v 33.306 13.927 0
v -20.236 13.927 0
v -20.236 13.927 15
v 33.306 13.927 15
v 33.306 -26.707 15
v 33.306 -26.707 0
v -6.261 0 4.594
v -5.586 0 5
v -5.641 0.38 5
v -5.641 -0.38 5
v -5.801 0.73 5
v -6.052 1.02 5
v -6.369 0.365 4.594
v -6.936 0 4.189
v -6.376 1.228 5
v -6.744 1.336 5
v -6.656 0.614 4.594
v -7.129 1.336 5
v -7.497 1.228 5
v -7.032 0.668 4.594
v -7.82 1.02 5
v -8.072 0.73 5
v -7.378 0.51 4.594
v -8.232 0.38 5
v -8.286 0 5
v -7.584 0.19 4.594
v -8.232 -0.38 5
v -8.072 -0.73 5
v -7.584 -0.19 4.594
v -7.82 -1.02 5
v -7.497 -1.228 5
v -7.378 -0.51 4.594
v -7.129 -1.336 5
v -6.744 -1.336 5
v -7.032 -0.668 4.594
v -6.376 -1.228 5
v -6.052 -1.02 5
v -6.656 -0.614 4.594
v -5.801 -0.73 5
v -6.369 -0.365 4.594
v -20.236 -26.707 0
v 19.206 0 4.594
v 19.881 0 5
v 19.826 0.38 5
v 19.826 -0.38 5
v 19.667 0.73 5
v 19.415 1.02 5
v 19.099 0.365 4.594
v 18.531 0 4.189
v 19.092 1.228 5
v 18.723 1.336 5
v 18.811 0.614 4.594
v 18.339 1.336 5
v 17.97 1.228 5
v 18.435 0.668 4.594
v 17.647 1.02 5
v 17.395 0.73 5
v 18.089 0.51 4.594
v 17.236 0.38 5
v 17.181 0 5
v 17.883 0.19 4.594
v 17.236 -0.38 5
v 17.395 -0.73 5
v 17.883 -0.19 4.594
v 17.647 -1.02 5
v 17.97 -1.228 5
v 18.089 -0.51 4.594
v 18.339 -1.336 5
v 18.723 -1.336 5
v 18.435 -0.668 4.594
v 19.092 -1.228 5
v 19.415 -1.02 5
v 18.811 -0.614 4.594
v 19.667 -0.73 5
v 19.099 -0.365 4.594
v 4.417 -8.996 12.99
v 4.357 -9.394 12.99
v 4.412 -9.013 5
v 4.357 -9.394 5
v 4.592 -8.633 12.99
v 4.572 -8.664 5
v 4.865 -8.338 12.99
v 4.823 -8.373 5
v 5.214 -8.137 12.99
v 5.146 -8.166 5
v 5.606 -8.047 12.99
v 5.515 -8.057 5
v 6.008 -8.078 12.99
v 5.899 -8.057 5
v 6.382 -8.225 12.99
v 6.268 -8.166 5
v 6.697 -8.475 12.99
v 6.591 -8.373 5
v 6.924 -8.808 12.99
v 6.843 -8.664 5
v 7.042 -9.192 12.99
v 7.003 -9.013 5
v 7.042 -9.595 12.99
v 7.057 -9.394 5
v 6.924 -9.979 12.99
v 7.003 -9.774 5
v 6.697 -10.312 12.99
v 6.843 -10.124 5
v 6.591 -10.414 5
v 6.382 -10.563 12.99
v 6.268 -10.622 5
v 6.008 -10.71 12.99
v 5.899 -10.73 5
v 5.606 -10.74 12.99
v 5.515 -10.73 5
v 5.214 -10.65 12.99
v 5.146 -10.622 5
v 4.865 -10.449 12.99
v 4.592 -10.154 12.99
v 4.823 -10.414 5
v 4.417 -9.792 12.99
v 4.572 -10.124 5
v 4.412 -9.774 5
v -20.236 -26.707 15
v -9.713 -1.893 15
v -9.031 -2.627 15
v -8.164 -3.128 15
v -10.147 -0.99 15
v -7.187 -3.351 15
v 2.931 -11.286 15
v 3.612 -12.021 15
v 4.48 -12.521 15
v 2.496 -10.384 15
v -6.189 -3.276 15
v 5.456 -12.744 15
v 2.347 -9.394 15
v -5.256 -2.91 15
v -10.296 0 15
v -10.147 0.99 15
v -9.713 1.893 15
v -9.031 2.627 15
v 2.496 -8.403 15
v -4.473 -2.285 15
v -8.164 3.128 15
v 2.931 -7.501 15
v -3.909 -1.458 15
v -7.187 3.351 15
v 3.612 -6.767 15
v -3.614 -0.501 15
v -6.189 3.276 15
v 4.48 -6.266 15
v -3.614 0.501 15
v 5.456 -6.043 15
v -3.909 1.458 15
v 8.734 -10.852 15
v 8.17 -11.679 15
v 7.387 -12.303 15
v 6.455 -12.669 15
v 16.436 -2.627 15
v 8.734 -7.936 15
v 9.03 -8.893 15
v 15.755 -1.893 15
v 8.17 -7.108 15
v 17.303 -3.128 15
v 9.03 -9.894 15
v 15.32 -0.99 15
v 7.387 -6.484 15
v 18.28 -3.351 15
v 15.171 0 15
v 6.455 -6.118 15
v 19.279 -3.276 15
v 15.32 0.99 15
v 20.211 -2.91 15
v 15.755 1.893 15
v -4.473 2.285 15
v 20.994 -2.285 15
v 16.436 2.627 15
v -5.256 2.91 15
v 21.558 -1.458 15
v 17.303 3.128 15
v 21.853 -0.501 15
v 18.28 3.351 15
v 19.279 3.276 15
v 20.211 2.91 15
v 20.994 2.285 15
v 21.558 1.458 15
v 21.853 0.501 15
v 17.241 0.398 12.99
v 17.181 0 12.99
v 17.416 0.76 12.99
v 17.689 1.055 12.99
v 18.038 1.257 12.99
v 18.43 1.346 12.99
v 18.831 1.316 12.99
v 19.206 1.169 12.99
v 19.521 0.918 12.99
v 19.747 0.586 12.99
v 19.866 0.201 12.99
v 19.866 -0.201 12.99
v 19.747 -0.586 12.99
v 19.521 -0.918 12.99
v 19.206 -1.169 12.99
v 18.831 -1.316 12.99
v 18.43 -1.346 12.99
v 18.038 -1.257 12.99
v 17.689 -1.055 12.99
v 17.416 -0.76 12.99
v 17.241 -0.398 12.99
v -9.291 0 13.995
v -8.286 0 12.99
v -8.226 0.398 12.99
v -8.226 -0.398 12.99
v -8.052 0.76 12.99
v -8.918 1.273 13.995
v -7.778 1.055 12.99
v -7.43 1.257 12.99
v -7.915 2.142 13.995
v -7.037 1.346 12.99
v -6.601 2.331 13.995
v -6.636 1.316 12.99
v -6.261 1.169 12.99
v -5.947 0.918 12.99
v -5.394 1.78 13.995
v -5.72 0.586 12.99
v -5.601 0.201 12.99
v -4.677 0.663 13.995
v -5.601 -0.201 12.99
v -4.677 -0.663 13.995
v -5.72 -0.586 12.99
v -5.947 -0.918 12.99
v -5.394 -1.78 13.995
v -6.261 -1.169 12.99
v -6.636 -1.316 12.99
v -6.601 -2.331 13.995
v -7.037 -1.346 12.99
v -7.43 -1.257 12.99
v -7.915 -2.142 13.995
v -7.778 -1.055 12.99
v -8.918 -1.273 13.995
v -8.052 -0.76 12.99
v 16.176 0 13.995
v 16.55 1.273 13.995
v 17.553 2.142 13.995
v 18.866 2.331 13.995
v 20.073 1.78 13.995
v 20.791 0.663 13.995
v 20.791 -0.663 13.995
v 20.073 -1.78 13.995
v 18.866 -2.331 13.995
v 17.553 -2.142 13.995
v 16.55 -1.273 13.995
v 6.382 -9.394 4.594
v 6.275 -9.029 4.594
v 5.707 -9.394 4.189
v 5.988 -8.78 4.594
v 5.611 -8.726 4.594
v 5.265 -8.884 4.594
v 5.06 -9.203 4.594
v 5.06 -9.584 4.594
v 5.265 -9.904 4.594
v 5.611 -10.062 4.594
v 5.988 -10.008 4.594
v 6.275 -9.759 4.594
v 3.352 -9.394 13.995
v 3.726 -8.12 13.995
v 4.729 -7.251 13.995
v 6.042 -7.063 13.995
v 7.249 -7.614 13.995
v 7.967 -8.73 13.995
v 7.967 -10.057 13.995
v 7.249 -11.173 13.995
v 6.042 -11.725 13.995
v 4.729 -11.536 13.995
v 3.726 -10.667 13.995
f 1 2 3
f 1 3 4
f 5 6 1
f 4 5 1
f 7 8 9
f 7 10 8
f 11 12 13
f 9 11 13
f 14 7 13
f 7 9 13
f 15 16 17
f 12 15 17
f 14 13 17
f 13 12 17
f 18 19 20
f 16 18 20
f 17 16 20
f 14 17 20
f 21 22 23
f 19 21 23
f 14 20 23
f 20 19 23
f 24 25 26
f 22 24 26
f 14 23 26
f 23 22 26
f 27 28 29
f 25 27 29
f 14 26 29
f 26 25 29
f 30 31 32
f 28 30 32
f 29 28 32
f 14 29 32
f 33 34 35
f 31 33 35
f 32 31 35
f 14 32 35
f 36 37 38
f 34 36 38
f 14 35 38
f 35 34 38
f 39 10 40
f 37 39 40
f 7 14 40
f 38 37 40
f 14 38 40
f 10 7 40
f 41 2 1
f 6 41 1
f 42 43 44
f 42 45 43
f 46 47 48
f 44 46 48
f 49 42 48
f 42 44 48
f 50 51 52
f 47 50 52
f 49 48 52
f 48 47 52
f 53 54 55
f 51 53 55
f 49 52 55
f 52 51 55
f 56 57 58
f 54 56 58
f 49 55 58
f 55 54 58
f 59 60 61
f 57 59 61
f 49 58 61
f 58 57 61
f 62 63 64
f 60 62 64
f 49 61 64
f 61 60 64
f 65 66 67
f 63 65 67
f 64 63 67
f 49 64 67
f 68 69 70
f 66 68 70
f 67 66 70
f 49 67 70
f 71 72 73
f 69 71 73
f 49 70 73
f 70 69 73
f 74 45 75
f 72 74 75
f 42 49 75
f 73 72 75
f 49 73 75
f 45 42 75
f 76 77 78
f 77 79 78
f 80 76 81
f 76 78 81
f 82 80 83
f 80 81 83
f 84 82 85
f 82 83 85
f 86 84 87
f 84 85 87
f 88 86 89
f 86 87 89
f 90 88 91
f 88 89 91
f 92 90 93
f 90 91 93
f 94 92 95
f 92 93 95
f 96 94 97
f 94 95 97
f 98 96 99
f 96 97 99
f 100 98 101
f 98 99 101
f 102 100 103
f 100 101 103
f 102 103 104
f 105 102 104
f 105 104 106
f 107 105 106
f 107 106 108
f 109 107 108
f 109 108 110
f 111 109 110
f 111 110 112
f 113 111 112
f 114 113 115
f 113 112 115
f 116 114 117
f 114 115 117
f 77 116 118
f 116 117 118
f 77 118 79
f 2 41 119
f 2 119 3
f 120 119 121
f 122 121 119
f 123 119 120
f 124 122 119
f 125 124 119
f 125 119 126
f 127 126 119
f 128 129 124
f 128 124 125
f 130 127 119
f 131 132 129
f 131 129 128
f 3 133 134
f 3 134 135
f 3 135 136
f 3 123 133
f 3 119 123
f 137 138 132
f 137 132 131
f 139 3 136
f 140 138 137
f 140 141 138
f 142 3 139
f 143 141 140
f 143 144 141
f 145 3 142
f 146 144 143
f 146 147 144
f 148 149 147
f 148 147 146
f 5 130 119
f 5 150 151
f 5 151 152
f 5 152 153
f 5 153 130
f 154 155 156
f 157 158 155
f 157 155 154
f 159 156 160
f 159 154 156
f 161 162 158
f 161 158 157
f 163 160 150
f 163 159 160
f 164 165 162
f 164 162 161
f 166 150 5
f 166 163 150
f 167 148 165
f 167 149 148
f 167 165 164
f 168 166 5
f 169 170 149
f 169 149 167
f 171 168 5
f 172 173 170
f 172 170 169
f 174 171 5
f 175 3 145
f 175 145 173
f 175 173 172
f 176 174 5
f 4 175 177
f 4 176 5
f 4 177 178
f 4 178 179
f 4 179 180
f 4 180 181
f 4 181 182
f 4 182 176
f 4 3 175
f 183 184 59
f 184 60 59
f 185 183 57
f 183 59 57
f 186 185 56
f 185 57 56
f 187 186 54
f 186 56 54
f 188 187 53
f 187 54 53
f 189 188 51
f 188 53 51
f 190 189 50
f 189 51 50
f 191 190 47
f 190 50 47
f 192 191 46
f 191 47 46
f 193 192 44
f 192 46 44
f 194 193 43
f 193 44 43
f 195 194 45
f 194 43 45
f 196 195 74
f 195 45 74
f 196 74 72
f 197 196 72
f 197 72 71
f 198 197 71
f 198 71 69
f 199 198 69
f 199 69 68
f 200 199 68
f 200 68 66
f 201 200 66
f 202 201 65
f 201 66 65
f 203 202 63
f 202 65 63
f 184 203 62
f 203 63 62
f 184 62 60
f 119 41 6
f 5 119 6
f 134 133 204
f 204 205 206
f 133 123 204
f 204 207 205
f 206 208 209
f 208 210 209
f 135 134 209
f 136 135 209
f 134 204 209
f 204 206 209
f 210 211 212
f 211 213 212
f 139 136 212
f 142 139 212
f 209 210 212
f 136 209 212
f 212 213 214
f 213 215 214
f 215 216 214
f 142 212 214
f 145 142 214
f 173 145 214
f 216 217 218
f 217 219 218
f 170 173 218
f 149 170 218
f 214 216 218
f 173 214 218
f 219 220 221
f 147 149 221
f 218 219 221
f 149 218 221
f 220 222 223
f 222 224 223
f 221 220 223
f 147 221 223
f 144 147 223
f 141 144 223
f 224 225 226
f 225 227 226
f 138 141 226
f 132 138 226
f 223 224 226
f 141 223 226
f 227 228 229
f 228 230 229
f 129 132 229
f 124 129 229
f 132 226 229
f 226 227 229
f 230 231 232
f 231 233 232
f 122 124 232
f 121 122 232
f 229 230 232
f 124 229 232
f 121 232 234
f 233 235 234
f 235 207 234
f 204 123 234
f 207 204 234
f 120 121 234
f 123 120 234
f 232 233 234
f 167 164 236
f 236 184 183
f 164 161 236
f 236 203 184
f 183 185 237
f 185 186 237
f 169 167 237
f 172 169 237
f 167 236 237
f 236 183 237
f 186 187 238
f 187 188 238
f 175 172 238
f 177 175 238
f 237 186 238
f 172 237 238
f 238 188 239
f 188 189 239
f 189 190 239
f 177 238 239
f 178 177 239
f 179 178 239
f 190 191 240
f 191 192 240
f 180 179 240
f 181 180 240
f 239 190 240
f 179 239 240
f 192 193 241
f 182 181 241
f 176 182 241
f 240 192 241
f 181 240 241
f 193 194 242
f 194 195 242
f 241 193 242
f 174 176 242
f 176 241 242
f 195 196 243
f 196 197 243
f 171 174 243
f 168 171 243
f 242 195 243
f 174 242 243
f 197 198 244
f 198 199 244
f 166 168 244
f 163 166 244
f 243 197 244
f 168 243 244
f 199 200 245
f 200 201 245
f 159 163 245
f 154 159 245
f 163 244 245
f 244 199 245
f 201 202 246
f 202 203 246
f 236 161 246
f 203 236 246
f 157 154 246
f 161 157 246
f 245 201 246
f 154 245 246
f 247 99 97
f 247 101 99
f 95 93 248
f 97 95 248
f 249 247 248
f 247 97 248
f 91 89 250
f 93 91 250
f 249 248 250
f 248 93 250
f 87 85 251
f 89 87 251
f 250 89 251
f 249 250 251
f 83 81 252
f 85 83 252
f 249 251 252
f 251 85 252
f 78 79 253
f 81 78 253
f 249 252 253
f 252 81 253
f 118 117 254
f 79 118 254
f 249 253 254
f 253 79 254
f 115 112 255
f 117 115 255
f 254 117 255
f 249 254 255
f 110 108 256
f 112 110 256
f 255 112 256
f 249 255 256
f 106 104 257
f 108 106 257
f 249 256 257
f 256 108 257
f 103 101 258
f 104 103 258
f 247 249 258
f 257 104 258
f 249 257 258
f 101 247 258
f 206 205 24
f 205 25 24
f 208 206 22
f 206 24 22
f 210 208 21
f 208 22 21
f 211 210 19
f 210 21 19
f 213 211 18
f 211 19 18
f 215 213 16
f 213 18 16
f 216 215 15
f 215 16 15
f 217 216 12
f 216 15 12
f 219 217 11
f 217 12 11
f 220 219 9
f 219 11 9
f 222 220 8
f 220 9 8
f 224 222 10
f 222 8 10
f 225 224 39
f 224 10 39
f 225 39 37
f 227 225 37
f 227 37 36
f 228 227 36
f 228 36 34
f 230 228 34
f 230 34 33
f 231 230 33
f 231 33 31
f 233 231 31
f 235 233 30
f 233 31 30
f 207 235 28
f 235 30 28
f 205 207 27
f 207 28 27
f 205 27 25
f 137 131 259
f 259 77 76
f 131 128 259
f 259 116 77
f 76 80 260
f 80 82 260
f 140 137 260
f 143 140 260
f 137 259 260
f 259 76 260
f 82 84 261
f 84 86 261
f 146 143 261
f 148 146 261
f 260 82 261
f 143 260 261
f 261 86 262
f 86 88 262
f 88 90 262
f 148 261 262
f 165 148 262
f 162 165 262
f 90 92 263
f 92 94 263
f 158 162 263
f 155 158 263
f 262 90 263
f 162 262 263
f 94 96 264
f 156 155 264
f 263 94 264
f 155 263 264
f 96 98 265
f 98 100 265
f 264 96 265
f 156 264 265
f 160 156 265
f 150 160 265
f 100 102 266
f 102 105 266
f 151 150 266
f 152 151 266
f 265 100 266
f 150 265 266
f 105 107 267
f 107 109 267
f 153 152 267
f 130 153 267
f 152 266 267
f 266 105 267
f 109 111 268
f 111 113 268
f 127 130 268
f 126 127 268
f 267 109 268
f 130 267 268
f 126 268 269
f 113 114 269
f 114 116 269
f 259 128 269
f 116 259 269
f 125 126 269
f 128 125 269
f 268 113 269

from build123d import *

# Parameters (mm, degrees)
F0_W           = 53.5424593836
F0_H           = 40.6342418864
F1_DEPTH       = 15
F3_D           = 2.7
F3_DEPTH       = 10
F3_CSINK_D     = 6.72
F3_CSINK_ANGLE = 90
F3_TIP         = 0.8111618357


with BuildPart() as f1:
    # F0 (on Top) → F1 (new body)
    with BuildSketch(Plane.XY):
        with Locations((6.5348921344, -6.3900067471)):
            Rectangle(F0_W, F0_H)
    extrude(amount=F1_DEPTH)

    # F3
    with Locations(Plane.XY.offset(15)):
        with Locations((-6.9363857619, 0), (5.707198754, -9.3936529011), (18.5309629887, 0)):
            CounterSinkHole(F3_D / 2, F3_CSINK_D / 2, depth=F3_DEPTH, counter_sink_angle=F3_CSINK_ANGLE)
            with Locations((0, 0, -(F3_DEPTH + F3_TIP / 2))):  # 118° drill point
                Cone(0, F3_D / 2, F3_TIP, mode=Mode.SUBTRACT)


solid = f1.part
